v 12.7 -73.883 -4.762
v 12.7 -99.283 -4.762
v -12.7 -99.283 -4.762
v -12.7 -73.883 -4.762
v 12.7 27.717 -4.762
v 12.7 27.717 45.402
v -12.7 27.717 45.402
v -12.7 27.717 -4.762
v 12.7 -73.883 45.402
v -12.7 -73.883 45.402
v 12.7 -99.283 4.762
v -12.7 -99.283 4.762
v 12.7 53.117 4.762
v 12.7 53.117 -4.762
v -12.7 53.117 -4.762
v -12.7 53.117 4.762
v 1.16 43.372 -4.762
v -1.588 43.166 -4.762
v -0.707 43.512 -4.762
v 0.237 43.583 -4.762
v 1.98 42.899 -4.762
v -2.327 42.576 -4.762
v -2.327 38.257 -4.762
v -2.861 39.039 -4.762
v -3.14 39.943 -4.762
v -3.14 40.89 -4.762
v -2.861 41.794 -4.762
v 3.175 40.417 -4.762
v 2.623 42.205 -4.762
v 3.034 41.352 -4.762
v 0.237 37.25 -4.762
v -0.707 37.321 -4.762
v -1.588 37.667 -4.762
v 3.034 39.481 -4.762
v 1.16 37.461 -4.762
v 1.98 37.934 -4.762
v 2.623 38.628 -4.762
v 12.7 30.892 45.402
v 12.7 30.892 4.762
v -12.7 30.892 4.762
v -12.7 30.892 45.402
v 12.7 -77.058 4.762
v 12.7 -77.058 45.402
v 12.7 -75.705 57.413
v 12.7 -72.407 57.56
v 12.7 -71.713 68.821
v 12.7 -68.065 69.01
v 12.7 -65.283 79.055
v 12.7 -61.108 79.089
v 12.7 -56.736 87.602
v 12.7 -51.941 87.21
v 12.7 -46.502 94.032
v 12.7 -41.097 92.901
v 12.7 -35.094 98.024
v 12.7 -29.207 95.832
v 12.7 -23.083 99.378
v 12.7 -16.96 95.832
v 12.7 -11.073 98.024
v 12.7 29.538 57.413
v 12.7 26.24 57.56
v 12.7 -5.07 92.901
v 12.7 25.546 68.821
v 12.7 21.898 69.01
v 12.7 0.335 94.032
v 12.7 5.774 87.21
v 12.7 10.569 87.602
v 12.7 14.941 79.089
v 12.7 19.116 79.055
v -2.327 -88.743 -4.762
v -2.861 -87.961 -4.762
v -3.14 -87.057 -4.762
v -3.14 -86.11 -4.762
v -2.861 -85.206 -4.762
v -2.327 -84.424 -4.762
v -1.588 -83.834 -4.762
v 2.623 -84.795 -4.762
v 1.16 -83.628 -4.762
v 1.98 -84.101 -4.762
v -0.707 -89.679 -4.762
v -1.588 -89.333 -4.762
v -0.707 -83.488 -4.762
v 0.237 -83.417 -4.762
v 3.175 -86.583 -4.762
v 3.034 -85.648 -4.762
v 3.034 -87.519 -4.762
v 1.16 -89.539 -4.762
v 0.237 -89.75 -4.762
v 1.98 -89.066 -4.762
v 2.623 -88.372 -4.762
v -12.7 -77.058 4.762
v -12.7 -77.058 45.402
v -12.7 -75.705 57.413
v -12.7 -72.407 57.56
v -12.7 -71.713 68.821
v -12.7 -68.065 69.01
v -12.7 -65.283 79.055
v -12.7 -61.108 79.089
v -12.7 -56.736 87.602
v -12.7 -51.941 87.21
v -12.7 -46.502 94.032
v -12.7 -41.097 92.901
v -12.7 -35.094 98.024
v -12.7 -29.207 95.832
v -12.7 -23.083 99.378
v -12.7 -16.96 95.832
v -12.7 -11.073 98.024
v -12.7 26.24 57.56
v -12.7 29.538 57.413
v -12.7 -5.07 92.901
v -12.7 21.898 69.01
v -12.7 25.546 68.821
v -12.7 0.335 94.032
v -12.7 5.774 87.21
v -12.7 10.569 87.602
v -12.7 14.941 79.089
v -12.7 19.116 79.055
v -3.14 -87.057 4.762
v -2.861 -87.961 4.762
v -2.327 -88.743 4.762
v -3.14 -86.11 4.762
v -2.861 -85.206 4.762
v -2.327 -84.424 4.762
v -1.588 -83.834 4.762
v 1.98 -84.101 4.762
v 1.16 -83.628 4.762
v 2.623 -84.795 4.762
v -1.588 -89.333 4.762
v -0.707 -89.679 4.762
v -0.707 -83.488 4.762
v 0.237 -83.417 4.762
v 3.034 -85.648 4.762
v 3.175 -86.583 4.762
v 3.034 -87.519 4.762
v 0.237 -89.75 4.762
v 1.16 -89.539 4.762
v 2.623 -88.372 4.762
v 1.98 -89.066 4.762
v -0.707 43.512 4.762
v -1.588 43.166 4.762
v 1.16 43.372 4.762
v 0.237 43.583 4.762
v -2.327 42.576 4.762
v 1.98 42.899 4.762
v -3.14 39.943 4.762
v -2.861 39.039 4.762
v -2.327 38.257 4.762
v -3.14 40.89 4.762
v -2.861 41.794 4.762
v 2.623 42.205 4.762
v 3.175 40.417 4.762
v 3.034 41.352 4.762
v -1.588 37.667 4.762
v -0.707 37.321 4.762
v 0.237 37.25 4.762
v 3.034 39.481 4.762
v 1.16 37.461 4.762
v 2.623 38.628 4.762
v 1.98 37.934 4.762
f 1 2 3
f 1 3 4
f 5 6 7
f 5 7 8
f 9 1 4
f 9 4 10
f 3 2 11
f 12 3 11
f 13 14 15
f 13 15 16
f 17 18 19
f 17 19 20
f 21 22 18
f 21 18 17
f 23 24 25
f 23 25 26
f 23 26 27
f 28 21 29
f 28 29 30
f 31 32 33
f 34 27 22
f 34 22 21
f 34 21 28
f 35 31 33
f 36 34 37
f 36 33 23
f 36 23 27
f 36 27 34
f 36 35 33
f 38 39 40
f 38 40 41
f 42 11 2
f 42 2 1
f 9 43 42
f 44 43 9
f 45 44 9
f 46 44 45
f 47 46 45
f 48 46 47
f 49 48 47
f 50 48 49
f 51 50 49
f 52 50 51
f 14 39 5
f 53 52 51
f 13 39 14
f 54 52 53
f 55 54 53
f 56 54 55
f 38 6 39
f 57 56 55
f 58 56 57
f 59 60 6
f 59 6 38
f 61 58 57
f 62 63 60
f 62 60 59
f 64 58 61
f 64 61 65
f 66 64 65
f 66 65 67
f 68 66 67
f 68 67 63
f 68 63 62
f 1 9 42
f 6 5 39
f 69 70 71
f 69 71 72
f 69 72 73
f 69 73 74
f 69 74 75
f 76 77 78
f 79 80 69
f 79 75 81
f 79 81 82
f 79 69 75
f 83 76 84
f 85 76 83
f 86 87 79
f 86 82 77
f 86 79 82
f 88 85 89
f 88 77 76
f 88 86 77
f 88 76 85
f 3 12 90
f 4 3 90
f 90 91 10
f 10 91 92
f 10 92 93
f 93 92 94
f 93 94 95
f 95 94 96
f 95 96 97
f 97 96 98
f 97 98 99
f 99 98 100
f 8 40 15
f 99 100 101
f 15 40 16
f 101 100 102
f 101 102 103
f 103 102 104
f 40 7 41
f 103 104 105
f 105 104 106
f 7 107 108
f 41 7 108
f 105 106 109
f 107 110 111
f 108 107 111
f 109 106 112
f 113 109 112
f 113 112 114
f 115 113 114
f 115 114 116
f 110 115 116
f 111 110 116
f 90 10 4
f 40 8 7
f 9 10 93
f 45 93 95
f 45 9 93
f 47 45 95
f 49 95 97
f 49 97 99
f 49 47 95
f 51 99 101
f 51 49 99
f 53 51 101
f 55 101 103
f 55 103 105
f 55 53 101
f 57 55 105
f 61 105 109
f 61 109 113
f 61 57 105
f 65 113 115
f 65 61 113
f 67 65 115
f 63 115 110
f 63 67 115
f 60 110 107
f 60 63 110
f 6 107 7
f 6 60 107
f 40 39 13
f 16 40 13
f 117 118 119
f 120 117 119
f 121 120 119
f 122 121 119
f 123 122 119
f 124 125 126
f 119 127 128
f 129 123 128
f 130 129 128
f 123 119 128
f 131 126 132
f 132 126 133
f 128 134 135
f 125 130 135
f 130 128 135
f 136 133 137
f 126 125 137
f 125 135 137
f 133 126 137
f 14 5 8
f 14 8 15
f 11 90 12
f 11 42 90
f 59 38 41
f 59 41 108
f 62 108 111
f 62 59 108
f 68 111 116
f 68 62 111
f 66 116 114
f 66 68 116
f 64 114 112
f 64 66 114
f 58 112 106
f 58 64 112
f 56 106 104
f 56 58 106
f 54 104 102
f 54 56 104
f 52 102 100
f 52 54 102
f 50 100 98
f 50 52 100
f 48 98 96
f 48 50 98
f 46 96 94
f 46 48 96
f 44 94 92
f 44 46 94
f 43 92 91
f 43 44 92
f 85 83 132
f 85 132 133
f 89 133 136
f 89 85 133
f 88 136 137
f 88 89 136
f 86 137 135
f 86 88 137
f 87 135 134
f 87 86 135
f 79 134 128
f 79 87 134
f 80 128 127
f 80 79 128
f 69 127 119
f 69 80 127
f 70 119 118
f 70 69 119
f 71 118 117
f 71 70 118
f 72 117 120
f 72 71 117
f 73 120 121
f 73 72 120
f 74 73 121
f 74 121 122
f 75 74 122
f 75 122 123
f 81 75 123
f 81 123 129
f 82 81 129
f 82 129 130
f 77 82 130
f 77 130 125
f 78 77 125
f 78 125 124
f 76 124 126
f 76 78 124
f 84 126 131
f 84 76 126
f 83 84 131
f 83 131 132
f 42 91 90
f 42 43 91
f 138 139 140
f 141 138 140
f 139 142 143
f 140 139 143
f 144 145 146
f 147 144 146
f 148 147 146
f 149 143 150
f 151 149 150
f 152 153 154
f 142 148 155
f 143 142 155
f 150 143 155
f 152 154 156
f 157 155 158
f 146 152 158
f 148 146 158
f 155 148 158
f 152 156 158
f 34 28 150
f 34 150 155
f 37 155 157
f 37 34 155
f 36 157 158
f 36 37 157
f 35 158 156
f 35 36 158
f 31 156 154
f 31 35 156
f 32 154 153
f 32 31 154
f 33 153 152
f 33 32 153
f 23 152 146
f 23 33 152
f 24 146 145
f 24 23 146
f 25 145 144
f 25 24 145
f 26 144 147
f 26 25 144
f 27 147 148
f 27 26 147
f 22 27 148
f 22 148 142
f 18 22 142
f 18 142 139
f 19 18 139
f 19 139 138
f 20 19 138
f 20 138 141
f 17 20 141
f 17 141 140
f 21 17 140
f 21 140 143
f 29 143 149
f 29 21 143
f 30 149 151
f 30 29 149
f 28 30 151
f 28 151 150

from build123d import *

# Parameters (mm, degrees)
F0_W     = 22.225
F0_H     = 9.525
F0_W_2   = 3.175
F1_DEPTH = 12.7
F2_R     = 3.175
F3_DEPTH = 9.525
F4_R     = 3.175
F5_DEPTH = 9.525


with BuildPart() as f1:
    # F0 (on Right) → F1 (new body, symmetric)
    with BuildSketch(Plane.YZ):
        with Locations((-88.1709930871, 0)):
            Rectangle(F0_W, F0_H)
        with Locations((-75.4709930871, 0)):
            Rectangle(F0_W_2, F0_H)
        with BuildLine():
            Line((-77.0584930871, 4.7625), (-73.8834930871, 4.7625))
            Line((-73.8834930871, 4.7625), (-73.8834930871, 45.4025))
            ThreePointArc((-73.8834930871, 45.4025), (-23.0834930871, 96.2025), (27.7165069129, 45.4025))
            Line((27.7165069129, 45.4025), (27.7165069129, 4.7625))
            Line((27.7165069129, 4.7625), (30.8915069129, 4.7625))
            Line((30.8915069129, 4.7625), (30.8915069129, 45.4025))
            ThreePointArc((30.8915069129, 45.4025), (-23.0834930871, 99.3775), (-77.0584930871, 45.4025))
            Line((-77.0584930871, 45.4025), (-77.0584930871, 4.7625))
        make_face()
        with Locations((42.0040069129, 0)):
            Rectangle(F0_W, F0_H)
        with Locations((29.3040069129, 0)):
            Rectangle(F0_W_2, F0_H)
    extrude(amount=F1_DEPTH, both=True)


with BuildPart() as f3:
    # F2 (on face) → F3 (new body)
    with BuildSketch(Plane(origin=(0, 0, -4.7625), x_dir=(1, 0, 0), z_dir=(0, 0, -1))):
        with Locations((0, -40.4165069129)):
            Circle(F2_R)
    extrude(amount=-F3_DEPTH)


with BuildPart() as f5:
    # F4 (on face) → F5 (new body)
    with BuildSketch(Plane(origin=(0, 0, -4.7625), x_dir=(1, 0, 0), z_dir=(0, 0, -1))):
        with Locations((0, 86.5834930871)):
            Circle(F4_R)
    extrude(amount=-F5_DEPTH)


solid = Compound([f1.part, f3.part, f5.part])
